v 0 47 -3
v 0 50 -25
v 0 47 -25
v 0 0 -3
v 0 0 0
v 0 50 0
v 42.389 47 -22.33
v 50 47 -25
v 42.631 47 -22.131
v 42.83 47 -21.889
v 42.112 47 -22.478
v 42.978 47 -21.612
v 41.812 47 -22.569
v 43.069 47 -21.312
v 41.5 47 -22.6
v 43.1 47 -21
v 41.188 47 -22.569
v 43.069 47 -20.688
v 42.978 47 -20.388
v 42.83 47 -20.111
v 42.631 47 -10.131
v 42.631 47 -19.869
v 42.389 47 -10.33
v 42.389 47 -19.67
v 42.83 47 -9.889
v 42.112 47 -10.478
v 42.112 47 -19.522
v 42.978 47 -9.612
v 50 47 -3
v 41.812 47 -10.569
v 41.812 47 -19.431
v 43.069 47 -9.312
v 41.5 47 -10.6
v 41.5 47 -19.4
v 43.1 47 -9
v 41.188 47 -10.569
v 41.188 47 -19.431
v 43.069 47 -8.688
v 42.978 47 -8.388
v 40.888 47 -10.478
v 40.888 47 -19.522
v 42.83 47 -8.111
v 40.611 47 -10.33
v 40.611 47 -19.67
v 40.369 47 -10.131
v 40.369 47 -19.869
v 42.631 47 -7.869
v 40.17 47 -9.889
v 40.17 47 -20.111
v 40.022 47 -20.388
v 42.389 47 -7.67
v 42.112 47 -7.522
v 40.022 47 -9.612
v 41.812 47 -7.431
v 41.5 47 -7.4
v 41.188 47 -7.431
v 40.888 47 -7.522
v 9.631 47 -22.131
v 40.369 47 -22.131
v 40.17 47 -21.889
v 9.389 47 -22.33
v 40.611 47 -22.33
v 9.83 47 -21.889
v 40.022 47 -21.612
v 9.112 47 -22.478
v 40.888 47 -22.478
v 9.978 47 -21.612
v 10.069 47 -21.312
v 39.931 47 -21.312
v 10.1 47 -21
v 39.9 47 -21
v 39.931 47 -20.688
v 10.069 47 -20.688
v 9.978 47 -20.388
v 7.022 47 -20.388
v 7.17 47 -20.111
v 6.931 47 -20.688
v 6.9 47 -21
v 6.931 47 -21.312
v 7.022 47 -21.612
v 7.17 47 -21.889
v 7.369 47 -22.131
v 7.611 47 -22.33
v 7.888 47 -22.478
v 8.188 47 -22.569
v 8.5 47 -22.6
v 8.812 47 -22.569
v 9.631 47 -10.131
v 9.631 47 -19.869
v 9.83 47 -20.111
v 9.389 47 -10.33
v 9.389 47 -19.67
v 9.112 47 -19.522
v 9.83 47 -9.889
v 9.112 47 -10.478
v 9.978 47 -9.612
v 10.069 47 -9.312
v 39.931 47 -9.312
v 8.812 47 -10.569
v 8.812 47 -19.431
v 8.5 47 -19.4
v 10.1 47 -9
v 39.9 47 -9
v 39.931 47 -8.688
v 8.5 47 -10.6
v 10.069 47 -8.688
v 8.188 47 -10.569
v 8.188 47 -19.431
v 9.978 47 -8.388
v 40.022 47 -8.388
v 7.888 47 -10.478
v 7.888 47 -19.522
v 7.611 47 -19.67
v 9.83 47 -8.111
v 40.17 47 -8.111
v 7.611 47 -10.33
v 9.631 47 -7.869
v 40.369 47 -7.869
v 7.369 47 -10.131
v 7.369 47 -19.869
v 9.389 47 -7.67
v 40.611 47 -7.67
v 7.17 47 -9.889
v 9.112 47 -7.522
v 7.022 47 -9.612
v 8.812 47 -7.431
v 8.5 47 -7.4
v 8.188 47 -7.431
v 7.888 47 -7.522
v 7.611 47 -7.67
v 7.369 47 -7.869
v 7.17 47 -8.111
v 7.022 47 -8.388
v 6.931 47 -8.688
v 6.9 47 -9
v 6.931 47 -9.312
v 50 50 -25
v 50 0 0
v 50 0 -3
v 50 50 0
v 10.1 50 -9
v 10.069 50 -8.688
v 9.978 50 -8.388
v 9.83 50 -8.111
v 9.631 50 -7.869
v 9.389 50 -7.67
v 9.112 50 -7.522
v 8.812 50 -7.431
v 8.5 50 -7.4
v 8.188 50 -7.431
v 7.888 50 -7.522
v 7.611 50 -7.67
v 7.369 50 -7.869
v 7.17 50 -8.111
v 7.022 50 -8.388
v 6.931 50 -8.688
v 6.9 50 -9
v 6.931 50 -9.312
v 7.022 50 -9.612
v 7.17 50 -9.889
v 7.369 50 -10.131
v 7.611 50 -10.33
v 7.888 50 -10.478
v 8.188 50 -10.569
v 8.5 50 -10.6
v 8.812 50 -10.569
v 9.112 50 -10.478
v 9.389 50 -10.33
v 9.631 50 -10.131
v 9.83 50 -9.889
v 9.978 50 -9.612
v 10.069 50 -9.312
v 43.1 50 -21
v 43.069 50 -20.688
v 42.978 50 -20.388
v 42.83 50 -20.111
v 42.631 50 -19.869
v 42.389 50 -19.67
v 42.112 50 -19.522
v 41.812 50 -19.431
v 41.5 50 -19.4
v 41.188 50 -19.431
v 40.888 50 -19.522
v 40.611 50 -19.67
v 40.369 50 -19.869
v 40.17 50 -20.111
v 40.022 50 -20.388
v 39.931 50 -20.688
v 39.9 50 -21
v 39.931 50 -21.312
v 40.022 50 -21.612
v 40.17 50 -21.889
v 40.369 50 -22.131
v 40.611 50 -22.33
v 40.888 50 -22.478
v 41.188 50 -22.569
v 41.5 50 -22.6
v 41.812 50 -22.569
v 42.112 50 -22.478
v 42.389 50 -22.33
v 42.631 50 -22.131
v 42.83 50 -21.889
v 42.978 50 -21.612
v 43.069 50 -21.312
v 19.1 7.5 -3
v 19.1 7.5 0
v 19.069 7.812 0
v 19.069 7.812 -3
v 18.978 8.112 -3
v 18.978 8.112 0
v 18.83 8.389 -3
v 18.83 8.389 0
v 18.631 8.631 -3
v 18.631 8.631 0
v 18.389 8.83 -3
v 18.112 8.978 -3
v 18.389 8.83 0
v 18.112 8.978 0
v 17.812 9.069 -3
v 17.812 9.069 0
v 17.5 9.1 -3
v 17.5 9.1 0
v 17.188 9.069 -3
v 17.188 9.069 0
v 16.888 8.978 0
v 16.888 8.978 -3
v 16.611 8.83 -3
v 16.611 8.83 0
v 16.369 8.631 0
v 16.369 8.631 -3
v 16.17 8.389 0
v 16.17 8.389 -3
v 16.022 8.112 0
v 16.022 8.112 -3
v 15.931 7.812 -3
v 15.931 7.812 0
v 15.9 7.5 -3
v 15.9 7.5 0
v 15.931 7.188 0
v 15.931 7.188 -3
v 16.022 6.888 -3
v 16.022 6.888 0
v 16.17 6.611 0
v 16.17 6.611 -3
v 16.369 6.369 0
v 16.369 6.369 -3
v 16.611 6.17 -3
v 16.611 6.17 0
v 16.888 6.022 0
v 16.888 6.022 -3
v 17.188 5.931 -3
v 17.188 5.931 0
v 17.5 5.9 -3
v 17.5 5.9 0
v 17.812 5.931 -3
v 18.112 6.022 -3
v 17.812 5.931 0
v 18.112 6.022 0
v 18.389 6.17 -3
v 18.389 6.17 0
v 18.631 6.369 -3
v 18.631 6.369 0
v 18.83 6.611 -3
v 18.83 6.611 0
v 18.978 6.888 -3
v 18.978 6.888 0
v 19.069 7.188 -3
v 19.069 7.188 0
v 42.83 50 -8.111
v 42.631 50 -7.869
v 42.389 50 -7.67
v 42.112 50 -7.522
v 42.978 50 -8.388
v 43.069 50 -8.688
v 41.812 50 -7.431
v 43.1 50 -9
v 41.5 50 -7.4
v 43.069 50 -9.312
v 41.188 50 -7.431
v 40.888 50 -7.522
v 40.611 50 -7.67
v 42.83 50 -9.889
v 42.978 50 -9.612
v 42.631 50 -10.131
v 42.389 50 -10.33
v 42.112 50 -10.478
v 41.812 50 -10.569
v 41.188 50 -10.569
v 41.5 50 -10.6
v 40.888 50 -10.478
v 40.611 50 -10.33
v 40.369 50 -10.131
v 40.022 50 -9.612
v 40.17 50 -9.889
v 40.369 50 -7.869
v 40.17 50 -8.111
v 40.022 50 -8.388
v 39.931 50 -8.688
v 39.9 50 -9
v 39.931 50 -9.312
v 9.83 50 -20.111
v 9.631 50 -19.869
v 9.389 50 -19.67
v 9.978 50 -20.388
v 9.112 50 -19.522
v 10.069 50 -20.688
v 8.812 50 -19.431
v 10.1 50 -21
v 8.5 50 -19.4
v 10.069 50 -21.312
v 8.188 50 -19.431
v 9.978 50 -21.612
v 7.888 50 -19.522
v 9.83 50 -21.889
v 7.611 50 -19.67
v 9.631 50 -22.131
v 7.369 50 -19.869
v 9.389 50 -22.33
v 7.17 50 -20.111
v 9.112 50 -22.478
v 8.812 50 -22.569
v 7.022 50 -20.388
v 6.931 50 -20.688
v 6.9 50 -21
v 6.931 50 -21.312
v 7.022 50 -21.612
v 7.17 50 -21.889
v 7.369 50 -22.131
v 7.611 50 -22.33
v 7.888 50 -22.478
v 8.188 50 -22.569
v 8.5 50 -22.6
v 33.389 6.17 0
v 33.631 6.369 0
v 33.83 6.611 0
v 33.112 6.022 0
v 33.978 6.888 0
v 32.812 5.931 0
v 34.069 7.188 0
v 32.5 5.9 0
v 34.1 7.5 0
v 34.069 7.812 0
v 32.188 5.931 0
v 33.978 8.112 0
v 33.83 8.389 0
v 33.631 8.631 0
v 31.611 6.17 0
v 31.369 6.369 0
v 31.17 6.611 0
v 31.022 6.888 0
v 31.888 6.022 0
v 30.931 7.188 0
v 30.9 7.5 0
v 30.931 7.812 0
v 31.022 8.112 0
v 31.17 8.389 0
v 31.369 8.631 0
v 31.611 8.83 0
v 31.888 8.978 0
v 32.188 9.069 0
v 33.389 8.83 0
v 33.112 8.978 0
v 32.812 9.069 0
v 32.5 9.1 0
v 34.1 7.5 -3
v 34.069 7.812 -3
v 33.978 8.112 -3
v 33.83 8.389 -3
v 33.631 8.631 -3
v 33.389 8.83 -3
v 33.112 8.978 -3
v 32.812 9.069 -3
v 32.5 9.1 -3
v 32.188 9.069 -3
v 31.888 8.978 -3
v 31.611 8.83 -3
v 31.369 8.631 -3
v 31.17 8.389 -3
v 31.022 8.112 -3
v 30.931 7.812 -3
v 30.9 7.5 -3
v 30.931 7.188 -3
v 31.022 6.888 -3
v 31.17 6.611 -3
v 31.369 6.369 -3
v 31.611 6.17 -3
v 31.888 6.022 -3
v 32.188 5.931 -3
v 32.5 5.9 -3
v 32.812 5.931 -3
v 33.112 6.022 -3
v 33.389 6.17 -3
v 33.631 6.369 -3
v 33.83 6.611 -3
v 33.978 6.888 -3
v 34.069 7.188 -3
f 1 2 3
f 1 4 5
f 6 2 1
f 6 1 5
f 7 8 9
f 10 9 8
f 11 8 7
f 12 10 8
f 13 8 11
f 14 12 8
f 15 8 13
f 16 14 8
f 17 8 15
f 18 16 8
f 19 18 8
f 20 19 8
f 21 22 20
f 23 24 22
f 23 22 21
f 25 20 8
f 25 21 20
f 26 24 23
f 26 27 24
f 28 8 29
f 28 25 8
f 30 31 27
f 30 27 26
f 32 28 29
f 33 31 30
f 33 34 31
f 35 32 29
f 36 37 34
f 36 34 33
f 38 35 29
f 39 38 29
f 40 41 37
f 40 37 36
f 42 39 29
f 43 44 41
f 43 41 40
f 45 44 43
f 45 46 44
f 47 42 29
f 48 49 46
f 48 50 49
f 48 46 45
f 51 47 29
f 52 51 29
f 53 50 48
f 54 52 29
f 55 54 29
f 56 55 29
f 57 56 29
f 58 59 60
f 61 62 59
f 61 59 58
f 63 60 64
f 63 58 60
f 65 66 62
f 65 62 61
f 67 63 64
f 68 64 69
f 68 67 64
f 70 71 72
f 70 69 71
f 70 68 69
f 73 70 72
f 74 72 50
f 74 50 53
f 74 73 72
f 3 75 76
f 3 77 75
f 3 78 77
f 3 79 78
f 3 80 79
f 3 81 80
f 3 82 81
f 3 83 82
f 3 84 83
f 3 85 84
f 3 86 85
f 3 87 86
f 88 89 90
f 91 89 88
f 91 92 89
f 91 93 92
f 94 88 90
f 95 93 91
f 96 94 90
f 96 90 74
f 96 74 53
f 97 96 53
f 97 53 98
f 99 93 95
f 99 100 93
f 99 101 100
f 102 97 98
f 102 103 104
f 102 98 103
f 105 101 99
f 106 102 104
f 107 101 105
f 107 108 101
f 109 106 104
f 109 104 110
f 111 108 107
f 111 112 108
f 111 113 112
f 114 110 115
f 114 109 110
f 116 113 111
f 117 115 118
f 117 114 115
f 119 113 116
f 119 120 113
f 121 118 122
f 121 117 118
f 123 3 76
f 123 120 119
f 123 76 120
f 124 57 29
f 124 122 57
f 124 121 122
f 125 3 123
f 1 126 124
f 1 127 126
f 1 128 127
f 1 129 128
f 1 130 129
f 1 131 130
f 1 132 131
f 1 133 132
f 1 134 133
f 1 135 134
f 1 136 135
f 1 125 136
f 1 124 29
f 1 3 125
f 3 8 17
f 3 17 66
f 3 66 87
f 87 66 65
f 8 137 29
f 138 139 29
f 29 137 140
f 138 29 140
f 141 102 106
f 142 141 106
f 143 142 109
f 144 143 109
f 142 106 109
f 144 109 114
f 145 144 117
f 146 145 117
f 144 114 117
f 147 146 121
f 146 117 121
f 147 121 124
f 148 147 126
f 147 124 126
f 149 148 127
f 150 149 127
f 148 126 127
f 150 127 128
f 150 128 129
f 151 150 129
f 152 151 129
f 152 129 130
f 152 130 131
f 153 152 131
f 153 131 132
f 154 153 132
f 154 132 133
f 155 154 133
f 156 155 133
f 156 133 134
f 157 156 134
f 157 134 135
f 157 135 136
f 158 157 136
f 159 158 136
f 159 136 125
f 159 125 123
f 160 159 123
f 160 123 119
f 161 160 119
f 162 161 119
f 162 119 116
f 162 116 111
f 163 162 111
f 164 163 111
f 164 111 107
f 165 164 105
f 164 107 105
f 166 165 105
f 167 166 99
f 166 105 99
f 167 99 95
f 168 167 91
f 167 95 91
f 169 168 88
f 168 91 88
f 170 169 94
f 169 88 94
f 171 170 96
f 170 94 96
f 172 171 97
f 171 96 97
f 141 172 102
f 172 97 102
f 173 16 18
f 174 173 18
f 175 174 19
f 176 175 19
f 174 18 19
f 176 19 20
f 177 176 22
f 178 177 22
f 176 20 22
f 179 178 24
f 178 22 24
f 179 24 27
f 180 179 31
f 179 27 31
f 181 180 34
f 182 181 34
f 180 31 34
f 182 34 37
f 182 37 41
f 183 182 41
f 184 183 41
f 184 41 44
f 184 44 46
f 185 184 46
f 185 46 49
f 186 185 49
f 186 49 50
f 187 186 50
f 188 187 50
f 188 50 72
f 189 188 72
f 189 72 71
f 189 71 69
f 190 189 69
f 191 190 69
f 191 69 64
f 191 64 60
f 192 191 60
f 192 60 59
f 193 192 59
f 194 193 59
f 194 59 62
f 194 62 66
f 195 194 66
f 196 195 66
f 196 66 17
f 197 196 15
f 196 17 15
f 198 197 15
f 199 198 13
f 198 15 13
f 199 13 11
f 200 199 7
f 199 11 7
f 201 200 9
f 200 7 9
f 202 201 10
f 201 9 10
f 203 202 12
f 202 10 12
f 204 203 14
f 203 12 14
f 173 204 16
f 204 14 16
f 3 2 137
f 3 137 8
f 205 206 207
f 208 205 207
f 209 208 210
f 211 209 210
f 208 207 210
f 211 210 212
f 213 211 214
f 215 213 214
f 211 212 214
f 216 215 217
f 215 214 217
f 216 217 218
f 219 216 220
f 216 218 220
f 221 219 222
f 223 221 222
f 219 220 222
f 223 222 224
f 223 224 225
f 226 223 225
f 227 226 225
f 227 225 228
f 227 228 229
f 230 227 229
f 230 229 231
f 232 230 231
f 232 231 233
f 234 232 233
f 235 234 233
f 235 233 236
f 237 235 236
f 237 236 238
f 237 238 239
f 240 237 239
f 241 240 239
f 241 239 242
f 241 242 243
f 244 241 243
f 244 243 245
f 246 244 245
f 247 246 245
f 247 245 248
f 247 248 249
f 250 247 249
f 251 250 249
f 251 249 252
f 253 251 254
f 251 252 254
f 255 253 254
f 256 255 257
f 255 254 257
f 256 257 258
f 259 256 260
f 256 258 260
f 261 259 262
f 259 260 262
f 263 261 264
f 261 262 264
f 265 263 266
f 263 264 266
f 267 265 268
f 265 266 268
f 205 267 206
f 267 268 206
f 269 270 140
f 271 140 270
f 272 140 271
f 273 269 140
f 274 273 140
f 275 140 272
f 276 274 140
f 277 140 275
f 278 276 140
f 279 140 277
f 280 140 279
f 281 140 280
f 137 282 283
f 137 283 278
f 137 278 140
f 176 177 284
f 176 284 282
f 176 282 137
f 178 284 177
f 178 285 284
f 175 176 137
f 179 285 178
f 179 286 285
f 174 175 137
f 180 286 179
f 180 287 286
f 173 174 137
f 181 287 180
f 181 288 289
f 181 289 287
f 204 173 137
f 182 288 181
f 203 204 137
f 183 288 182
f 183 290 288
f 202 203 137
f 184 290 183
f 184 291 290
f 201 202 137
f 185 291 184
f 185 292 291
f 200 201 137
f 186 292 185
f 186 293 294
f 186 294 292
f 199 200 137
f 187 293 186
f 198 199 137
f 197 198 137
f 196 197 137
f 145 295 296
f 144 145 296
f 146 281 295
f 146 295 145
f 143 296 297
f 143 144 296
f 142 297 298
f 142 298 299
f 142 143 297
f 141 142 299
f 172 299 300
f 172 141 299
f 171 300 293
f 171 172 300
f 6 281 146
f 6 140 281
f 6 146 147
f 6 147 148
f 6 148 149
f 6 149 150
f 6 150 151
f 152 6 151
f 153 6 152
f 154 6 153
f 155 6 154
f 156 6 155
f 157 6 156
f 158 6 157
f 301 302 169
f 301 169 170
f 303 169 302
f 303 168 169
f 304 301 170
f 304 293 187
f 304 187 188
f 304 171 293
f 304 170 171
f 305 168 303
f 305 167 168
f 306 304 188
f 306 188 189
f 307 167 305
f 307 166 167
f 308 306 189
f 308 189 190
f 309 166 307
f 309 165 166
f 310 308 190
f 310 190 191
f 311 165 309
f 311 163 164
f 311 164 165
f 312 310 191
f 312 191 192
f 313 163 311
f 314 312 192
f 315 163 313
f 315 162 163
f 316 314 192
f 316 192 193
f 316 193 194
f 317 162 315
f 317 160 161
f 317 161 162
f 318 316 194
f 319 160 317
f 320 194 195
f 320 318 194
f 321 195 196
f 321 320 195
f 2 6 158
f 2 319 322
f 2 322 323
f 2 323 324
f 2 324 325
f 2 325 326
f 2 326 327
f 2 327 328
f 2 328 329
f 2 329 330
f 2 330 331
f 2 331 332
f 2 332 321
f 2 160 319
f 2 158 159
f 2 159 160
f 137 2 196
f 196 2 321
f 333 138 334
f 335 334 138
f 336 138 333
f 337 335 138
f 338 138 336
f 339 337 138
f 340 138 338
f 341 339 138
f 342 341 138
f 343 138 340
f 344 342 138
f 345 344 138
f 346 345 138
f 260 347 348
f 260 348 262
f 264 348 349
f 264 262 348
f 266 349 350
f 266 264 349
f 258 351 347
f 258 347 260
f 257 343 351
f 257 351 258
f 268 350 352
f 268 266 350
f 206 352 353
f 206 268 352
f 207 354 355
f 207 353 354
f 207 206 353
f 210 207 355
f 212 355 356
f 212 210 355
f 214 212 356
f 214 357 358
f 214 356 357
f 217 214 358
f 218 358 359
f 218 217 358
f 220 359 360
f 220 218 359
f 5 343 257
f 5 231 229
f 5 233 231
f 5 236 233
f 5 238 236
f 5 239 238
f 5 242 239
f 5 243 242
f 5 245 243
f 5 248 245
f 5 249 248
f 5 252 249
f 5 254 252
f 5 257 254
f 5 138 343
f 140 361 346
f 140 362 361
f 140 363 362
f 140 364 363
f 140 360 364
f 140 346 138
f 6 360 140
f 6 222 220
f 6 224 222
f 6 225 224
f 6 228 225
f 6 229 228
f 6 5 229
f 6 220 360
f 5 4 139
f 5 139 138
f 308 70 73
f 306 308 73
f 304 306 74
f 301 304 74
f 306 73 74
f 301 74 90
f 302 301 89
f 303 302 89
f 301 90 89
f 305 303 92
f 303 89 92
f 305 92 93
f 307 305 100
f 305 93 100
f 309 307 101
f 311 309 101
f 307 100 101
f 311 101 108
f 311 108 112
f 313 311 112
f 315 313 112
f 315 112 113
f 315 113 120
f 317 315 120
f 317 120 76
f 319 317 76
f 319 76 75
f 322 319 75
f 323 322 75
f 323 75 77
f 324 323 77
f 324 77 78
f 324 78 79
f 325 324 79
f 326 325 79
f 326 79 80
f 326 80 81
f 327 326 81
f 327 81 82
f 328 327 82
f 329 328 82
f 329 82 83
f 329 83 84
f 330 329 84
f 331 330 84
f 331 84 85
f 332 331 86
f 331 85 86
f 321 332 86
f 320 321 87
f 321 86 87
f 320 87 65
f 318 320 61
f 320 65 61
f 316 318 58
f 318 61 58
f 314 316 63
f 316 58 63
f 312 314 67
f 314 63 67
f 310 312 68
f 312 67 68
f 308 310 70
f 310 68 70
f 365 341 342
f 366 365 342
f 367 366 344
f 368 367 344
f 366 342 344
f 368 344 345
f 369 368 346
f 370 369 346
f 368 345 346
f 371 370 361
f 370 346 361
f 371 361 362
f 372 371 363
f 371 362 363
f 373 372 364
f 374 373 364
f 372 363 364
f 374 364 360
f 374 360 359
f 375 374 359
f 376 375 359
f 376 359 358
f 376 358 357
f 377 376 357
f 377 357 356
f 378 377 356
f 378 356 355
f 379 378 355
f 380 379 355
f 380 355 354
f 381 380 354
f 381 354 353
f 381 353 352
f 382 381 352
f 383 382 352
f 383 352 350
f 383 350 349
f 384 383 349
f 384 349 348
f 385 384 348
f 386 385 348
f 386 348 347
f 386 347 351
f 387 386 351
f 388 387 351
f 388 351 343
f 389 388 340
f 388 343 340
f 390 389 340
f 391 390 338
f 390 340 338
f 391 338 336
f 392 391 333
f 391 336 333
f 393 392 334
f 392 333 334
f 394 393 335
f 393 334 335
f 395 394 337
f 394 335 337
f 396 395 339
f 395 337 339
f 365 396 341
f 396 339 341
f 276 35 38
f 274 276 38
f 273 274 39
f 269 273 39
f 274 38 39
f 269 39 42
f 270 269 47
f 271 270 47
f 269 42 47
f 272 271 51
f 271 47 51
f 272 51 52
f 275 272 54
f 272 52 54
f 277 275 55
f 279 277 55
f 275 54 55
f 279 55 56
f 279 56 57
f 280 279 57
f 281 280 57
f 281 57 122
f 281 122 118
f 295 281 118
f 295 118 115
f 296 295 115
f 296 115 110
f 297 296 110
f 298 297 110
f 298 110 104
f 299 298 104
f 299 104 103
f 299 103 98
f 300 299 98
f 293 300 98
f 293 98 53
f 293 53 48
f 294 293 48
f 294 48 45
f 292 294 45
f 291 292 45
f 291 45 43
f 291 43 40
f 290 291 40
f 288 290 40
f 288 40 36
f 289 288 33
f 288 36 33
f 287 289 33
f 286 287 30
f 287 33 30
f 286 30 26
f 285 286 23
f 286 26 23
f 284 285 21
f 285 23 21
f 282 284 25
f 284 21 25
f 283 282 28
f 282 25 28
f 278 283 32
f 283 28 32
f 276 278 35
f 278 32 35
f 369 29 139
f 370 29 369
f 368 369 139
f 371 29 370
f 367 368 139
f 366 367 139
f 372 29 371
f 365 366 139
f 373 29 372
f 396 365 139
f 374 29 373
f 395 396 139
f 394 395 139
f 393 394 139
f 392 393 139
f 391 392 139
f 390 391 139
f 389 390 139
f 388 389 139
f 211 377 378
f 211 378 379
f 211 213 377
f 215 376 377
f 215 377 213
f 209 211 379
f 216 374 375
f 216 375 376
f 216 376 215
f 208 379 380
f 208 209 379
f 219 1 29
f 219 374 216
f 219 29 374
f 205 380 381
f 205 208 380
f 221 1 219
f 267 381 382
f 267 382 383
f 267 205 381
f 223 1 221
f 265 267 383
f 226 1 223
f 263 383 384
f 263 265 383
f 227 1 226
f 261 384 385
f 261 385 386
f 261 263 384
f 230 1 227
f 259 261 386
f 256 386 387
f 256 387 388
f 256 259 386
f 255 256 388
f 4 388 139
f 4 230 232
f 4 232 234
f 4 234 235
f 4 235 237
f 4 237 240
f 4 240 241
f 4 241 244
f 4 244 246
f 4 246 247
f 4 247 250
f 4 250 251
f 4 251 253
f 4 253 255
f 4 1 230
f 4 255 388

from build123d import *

# Parameters (mm, degrees)
EXTRUDE_1_DEPTH     = 50
SKETCH_2_R          = 1.6
CUT_EXTRUDE_1_DEPTH = 4
SKETCH_3_R          = 1.6
CUT_EXTRUDE_2_DEPTH = 26


with BuildPart() as part:
    # ｽｹｯﾁ1 → ﾎﾞｽ - 押し出し1 (new body)
    with BuildSketch(Plane(origin=(0, 0, 0), x_dir=(0, 0, -1), z_dir=(1, 0, 0))):
        Polygon((0, 50), (25, 50), (25, 47), (3, 47), (3, 0), (0, 0), align=None)
    extrude(amount=EXTRUDE_1_DEPTH)

    # ｽｹｯﾁ2 → ｶｯﾄ - 押し出し1 (cut, through all)
    with BuildSketch(Plane.XZ.offset(-47)):
        with Locations((8.5, -9)):
            Circle(SKETCH_2_R)
        with Locations((8.5, -21)):
            Circle(SKETCH_2_R)
        with Locations((41.5, -9)):
            Circle(SKETCH_2_R)
        with Locations((41.5, -21)):
            Circle(SKETCH_2_R)
    extrude(amount=-CUT_EXTRUDE_1_DEPTH, mode=Mode.SUBTRACT)

    # ｽｹｯﾁ3 → ｶｯﾄ - 押し出し2 (cut, through all)
    with BuildSketch(Plane.XY):
        with Locations((17.5, 7.5)):
            Circle(SKETCH_3_R)
        with Locations((32.5, 7.5)):
            Circle(SKETCH_3_R)
    extrude(amount=-CUT_EXTRUDE_2_DEPTH, mode=Mode.SUBTRACT)


solid = part.part
